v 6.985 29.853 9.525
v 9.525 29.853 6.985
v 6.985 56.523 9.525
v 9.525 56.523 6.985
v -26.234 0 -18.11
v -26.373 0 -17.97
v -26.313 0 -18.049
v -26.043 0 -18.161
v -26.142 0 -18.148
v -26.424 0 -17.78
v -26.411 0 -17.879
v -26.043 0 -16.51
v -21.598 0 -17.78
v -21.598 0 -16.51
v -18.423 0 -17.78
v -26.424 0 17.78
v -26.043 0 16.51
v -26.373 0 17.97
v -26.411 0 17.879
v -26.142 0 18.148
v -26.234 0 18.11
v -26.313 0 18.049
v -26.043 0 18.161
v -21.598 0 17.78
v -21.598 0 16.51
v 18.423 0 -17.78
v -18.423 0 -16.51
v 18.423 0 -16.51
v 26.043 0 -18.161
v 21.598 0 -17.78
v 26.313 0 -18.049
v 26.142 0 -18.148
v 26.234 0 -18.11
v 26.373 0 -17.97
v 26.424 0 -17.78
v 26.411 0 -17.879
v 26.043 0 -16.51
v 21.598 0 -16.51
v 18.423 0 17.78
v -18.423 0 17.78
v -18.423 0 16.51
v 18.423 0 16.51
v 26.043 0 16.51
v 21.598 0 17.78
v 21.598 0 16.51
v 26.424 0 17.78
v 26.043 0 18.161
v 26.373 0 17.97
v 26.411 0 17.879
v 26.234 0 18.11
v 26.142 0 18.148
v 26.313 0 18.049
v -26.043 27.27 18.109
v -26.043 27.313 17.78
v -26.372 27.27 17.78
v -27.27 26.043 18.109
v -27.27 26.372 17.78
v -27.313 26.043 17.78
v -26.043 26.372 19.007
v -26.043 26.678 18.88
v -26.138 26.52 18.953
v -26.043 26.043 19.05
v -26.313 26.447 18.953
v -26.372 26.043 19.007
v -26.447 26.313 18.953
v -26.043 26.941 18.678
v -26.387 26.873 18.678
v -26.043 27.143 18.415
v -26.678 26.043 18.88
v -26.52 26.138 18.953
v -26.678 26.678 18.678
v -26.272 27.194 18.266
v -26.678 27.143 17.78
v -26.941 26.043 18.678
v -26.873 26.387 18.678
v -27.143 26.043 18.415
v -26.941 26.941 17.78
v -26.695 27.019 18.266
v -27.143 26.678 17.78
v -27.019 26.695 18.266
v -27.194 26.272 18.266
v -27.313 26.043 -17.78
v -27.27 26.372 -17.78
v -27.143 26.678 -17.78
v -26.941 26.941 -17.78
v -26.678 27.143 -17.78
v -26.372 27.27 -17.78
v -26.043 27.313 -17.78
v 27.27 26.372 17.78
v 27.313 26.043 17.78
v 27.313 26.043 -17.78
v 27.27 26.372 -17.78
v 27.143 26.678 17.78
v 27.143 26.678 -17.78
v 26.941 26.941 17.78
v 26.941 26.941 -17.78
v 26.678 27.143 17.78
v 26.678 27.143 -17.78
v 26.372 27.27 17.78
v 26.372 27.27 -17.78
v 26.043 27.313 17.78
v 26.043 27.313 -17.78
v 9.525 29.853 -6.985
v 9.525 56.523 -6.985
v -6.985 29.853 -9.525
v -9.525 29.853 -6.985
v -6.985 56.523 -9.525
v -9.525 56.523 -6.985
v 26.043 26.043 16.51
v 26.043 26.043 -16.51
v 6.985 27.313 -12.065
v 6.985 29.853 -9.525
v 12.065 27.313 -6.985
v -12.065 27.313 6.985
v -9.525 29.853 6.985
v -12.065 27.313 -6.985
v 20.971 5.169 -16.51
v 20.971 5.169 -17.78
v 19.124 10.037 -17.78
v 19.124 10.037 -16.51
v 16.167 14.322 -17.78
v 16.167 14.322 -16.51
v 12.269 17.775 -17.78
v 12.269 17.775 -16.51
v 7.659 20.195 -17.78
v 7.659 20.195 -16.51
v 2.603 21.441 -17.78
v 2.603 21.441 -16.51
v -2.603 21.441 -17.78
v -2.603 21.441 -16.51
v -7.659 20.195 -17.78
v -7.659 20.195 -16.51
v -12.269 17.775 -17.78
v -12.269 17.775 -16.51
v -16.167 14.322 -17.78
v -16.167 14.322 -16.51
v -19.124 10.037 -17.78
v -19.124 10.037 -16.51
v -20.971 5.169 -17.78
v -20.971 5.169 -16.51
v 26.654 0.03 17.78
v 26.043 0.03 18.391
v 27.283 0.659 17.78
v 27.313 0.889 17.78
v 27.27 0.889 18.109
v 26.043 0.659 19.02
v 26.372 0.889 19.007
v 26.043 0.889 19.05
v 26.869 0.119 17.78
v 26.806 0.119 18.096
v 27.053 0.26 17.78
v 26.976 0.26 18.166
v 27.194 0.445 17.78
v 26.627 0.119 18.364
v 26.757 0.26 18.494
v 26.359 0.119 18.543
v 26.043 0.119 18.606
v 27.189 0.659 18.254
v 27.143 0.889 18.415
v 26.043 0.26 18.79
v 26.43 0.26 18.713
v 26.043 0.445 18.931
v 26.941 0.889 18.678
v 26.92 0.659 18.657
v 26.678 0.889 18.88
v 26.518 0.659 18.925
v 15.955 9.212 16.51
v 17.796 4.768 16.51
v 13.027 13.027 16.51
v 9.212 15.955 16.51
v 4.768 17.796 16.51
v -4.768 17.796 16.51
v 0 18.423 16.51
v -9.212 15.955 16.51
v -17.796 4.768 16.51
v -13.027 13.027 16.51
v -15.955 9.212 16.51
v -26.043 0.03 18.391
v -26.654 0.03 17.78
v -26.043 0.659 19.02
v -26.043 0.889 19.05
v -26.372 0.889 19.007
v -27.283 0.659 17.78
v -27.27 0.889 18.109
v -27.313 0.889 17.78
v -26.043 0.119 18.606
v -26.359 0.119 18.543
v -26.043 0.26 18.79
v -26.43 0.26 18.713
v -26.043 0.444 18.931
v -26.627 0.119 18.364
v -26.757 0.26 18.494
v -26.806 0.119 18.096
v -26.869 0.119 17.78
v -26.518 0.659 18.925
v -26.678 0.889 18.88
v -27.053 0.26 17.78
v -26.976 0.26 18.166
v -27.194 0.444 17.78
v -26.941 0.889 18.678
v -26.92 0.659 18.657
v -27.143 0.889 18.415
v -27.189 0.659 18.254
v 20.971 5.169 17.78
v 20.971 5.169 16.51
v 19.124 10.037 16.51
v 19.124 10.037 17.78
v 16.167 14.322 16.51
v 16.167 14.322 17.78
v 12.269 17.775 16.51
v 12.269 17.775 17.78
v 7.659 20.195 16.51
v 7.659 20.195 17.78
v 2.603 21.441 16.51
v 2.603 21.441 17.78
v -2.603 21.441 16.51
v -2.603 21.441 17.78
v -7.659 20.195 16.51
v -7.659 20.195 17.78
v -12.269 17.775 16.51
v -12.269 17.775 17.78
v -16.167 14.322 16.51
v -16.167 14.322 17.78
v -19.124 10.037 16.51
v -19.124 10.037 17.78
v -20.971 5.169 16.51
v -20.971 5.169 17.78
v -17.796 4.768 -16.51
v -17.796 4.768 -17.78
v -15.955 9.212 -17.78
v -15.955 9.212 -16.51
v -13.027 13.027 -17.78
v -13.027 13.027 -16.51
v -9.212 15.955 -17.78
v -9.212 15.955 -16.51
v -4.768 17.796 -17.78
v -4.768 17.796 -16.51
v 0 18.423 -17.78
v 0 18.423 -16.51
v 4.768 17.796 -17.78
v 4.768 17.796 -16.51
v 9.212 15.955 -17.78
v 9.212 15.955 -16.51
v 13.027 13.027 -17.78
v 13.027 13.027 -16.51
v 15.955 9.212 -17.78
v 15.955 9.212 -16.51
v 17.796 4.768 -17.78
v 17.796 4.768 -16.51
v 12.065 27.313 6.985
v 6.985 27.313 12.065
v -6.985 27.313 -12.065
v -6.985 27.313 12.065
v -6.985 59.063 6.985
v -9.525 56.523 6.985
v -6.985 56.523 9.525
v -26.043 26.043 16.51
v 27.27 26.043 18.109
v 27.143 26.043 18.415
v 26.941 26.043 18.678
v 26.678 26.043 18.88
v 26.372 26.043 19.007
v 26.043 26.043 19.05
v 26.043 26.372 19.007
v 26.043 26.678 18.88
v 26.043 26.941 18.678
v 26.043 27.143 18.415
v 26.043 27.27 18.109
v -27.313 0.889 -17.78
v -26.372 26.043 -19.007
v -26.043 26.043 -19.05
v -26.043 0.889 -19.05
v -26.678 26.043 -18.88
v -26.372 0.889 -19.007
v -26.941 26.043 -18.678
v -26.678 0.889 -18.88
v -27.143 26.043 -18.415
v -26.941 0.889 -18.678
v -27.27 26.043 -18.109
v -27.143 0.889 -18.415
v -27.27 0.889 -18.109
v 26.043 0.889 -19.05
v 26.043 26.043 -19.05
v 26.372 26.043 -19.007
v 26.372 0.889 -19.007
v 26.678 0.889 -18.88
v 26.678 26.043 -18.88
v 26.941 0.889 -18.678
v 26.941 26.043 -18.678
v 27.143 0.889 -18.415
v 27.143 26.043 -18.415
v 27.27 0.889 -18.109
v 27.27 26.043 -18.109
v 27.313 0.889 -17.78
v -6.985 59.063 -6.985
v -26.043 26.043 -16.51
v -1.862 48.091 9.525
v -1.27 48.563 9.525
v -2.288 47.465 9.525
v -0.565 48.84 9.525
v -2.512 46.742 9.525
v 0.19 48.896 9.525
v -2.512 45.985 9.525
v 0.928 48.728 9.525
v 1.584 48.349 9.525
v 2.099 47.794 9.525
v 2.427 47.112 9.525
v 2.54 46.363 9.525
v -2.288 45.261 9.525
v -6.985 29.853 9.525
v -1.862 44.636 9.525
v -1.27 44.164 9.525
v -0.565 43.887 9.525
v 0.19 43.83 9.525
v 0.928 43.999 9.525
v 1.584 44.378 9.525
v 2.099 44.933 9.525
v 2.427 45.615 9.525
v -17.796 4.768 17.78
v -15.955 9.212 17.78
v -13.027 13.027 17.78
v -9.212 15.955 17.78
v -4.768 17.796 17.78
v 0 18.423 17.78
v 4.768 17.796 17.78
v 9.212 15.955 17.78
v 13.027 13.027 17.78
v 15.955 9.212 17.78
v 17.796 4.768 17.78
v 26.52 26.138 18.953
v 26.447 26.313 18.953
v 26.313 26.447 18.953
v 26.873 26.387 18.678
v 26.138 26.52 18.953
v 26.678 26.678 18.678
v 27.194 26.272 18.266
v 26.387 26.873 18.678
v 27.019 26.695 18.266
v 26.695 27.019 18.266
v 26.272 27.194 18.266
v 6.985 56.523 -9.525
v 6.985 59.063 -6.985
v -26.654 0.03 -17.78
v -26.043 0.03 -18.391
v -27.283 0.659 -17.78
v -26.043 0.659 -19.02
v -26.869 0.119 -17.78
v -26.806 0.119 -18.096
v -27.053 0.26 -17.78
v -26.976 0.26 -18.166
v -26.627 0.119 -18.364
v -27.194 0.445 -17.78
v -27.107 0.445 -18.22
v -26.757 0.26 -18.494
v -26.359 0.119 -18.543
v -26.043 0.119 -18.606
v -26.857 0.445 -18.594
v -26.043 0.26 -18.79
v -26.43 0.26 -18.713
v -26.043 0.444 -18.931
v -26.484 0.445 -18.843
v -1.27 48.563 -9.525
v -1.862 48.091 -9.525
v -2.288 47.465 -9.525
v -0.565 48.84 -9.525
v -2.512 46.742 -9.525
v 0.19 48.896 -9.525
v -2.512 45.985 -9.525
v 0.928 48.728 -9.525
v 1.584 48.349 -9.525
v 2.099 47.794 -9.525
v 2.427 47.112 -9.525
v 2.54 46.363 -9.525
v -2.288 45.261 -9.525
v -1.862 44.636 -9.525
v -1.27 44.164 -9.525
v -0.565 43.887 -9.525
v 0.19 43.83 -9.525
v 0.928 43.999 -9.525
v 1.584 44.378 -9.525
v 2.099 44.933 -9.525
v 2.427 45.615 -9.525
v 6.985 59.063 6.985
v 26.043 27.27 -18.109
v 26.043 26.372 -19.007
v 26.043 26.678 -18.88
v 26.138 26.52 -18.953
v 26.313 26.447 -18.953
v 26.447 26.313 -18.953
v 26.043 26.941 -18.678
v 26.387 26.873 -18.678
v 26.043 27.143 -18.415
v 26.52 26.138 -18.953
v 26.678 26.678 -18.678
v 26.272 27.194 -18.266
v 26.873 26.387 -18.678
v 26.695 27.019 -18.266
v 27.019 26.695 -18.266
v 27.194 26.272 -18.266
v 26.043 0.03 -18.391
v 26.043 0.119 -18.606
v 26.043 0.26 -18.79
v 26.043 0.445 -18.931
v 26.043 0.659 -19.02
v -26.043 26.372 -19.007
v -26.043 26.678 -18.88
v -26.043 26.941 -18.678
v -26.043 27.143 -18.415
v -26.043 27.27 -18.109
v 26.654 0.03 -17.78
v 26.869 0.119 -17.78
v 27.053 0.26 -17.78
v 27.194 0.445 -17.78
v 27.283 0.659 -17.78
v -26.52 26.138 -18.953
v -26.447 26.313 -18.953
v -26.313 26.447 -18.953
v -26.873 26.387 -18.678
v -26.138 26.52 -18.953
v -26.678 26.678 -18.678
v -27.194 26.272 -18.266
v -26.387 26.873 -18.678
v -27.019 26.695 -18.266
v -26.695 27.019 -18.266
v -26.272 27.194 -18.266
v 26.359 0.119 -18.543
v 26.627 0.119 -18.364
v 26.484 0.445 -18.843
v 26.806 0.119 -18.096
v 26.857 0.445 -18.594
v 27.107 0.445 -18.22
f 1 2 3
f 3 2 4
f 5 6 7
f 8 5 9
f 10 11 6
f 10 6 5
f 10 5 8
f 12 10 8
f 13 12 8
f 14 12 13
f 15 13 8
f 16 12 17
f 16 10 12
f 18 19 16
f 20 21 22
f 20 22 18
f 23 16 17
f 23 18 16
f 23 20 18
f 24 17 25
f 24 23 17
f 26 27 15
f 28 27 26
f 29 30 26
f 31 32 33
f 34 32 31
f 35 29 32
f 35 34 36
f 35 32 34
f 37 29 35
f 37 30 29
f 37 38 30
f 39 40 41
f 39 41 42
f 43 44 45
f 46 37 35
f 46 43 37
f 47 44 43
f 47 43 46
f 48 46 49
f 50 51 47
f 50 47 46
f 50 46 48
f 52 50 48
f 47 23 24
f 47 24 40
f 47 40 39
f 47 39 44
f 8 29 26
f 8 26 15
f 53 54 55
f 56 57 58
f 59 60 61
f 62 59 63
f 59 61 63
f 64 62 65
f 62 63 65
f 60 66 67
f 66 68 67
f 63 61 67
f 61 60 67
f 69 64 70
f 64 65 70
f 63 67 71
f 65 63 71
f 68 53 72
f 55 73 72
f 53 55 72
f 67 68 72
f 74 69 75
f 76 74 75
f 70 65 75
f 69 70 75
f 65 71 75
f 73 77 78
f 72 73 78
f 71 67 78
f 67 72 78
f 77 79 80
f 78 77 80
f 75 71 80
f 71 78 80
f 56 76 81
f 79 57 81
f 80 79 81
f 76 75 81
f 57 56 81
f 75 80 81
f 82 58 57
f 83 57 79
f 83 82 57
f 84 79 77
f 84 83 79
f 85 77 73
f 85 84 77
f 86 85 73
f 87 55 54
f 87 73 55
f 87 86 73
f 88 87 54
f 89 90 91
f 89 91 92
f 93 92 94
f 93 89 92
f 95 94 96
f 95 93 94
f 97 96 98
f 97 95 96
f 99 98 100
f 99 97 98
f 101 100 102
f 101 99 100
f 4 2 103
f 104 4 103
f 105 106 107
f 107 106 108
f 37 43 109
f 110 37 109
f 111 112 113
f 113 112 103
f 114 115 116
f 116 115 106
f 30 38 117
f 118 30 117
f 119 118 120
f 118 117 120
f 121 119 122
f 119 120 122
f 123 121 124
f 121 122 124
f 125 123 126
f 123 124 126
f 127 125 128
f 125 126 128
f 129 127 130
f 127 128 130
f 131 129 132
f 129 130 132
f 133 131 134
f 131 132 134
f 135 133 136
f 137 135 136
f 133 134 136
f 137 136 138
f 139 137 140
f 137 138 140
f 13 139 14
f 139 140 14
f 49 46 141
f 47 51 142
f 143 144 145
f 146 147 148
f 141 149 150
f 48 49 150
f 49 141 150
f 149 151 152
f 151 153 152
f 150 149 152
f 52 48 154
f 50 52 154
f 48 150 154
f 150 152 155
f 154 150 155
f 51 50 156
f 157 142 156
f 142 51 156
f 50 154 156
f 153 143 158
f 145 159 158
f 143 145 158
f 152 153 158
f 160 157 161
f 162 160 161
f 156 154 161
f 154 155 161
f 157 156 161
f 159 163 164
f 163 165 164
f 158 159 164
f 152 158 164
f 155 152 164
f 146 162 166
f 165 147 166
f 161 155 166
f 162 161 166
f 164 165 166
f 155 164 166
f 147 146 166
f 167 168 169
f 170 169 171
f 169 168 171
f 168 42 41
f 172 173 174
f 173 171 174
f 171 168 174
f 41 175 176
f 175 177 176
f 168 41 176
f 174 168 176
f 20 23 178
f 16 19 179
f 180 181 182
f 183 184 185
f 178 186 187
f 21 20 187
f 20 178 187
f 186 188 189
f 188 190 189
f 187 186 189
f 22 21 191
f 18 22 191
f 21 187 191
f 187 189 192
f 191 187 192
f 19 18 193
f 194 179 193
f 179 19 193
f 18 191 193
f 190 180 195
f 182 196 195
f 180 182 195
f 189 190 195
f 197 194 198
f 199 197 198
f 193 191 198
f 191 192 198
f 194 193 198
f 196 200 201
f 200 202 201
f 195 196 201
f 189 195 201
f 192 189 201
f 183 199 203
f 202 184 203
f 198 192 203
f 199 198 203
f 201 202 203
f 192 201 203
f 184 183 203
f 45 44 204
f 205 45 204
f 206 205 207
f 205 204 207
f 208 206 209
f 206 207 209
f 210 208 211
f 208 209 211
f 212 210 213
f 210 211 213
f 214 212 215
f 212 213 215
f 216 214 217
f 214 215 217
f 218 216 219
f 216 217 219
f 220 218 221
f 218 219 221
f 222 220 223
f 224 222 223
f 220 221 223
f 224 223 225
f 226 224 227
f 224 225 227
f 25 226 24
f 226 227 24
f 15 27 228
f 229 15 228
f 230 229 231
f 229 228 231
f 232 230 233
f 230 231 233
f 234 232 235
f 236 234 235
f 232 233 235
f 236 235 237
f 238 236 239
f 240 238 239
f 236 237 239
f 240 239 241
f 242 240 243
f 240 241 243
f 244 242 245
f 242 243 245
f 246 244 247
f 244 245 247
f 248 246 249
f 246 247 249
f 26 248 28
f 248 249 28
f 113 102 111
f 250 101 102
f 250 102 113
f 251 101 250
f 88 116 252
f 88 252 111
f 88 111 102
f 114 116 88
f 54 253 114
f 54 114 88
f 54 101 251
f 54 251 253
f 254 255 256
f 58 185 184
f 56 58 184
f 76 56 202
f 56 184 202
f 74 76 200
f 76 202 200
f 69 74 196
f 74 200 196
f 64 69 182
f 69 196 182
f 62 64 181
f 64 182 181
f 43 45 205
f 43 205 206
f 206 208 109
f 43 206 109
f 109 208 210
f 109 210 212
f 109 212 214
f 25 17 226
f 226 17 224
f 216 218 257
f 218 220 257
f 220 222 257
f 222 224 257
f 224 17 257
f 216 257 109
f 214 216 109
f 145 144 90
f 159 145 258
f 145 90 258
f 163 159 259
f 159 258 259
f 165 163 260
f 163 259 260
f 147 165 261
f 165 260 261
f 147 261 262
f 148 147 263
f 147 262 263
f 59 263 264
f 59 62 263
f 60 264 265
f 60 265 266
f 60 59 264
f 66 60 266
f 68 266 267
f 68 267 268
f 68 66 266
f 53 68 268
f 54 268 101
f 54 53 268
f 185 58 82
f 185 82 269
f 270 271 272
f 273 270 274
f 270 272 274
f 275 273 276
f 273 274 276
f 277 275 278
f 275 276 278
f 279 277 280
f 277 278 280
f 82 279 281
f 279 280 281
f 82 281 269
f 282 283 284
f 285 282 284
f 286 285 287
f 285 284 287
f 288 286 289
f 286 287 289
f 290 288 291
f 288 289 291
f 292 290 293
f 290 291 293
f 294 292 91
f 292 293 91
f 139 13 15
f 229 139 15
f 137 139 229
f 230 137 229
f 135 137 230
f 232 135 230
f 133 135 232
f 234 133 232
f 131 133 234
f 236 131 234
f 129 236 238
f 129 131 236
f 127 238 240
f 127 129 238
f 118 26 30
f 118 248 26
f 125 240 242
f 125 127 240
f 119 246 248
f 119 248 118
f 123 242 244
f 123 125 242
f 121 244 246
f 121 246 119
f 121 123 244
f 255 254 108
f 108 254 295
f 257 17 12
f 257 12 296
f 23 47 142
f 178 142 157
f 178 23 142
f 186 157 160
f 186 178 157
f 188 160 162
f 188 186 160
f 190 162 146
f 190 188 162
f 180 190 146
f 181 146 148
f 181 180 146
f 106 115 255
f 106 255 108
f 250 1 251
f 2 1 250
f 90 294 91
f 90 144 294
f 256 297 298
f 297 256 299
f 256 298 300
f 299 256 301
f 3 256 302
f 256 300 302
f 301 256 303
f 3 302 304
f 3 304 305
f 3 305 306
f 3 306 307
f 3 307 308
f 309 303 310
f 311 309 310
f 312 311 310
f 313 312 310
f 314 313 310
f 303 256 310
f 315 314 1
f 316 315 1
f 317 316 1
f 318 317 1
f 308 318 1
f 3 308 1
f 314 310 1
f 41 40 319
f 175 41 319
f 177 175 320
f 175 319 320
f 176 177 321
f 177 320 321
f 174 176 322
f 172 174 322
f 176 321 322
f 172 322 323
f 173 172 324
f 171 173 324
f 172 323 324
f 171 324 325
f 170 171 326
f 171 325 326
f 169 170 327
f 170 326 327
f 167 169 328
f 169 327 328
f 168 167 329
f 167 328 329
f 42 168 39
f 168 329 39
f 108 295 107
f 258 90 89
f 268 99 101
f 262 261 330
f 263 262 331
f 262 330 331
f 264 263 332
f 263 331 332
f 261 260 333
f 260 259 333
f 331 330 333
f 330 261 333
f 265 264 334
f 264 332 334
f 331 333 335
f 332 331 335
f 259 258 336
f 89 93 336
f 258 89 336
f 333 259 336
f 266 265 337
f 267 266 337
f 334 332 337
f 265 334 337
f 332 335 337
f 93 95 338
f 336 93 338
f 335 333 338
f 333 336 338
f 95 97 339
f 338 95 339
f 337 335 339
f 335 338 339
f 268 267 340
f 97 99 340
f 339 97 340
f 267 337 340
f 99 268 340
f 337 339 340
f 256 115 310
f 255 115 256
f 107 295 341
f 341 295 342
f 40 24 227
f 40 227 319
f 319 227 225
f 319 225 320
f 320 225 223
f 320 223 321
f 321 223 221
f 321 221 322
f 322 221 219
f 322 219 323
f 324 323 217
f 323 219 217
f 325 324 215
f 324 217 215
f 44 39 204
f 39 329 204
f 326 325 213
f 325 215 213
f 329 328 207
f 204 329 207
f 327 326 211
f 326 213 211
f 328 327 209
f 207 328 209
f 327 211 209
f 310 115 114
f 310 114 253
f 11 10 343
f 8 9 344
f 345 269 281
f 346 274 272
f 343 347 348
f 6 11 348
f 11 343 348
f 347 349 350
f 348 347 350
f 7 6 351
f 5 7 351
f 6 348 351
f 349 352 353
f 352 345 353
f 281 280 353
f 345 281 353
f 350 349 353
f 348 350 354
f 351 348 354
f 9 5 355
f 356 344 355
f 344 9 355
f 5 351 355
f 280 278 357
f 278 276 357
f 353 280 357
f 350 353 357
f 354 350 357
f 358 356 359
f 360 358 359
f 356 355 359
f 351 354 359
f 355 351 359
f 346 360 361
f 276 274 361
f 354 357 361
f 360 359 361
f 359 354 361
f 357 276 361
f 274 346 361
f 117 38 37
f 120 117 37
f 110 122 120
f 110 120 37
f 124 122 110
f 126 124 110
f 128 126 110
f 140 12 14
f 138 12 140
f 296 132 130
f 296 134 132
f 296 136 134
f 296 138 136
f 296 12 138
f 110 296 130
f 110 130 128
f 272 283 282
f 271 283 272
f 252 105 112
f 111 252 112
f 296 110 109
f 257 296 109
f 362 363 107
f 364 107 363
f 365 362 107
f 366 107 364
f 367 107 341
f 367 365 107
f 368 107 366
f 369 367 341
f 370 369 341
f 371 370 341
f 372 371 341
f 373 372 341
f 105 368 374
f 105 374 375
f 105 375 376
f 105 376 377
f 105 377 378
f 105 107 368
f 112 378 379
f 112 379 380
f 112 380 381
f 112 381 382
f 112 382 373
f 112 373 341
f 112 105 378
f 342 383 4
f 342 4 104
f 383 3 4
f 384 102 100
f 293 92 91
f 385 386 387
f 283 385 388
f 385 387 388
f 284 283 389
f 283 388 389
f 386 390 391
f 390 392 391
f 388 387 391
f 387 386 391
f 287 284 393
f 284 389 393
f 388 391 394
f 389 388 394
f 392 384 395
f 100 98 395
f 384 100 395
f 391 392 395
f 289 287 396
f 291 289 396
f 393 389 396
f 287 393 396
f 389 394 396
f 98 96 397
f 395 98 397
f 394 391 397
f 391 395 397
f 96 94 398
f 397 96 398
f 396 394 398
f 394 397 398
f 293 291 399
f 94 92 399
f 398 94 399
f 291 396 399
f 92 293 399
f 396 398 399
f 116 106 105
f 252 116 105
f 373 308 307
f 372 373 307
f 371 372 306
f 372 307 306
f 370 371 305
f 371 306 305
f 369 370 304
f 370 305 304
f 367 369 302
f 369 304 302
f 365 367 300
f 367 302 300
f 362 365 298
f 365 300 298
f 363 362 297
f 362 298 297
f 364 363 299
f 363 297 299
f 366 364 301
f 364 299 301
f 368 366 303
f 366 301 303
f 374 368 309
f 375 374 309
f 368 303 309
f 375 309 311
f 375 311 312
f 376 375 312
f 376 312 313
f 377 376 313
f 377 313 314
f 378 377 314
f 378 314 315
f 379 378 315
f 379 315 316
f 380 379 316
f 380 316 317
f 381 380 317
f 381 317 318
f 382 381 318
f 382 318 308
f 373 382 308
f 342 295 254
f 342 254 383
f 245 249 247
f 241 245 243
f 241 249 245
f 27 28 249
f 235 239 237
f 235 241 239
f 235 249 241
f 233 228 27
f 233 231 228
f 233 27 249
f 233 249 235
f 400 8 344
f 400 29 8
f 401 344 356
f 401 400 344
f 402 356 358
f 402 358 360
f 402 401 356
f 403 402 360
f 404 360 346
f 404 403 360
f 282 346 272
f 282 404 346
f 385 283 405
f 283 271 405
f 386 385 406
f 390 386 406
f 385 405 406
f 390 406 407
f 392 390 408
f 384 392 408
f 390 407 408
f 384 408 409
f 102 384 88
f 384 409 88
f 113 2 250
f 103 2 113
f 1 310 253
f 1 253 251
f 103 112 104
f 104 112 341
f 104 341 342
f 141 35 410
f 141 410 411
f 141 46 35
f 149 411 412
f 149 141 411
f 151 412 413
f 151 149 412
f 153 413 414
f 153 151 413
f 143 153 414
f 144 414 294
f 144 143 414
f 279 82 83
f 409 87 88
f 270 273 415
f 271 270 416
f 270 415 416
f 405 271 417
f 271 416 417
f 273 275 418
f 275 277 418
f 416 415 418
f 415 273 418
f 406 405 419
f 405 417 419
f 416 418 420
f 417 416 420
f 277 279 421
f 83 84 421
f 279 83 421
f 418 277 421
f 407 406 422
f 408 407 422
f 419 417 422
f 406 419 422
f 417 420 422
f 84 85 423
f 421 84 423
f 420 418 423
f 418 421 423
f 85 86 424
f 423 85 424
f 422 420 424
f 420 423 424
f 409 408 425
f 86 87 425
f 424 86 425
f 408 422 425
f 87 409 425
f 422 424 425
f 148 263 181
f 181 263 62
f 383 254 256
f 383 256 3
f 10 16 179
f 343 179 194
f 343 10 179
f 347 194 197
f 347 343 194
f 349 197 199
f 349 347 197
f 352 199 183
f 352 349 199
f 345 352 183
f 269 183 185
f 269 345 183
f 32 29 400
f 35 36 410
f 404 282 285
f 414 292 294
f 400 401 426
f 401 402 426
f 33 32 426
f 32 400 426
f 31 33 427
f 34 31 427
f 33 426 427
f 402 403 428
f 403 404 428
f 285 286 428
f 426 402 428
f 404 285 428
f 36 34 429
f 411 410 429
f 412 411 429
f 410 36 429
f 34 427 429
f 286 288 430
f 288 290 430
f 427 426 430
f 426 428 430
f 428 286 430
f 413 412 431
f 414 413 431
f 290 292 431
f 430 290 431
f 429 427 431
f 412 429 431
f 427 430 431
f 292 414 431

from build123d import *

# Parameters (mm, degrees)
MAIN_BODY_EXTRUDE_DEPTH        = 19.05
HINGE_START                    = -26.043353817
HINGE_SHELL_OUTLINE_W          = 26.043353817
HINGE_SHELL_OUTLINE_H          = 33.02
HINGE_SHELL_DEPTH              = 52.086707634
GROOVE_START                   = -16.51
GROOVE_1_DEPTH                 = 1.27
GROOVE_START_2                 = 17.78
GROOVE_2_DEPTH                 = 1.27
SKETCH5_W                      = 19.05
SKETCH5_H                      = 19.05
TIBIA_CONNECTION_EXTRUDE_DEPTH = 31.75
SKETCH6_R                      = 2.54
PINHOLE_CUT_DEPTH              = 25.4
FILLET1_R                      = 1.27
CHAMFER1_SIZE                  = 2.54
FILLET2_R                      = 0.889


# Read off the part's stored shape, not the designer's step: Hinge Shell
with BuildPart() as part:
    # Sketch1 → Main Body Extrude (new, symmetric)
    with BuildSketch(Plane.XY):
        with BuildLine():
            Line((18.423353817, 0), (-18.423353817, 0))
            ThreePointArc((-18.423353817, 0), (0, 18.423353817), (18.423353817, 0))
        make_face()
        with BuildLine():
            Line((18.423353817, 0), (21.598353817, 0))
            ThreePointArc((21.598353817, 0), (0, 21.598353817), (-21.598353817, 0))
            Line((-21.598353817, 0), (-18.423353817, 0))
            ThreePointArc((-18.423353817, 0), (0, 18.423353817), (18.423353817, 0))
        make_face()
        with BuildLine():
            Line((24.138353817, 0), (21.598353817, 0))
            ThreePointArc((21.598353817, 0), (0, 21.598353817), (-21.598353817, 0))
            Line((-21.598353817, 0), (-24.138353817, 0))
            ThreePointArc((-24.138353817, 0), (0, 24.138353817), (24.138353817, 0))
        make_face()
        with BuildLine():
            ThreePointArc((24.138353817, 0), (0, 24.138353817), (-24.138353817, 0))
            Line((-24.138353817, 0), (-24.773353817, 0))
            ThreePointArc((-24.773353817, 0), (0, 24.773353817), (24.773353817, 0))
            Line((24.773353817, 0), (24.138353817, 0))
        make_face()
        with BuildLine():
            Line((27.313353817, 0), (24.773353817, 0))
            ThreePointArc((24.773353817, 0), (0, 24.773353817), (-24.773353817, 0))
            Line((-24.773353817, 0), (-27.313353817, 0))
            ThreePointArc((-27.313353817, 0), (0, 27.313353817), (27.313353817, 0))
        make_face()
        with BuildLine():
            Line((-27.313353817, 27.313353817), (-27.313353817, 0))
            ThreePointArc((-27.313353817, 0), (-19.313457701, 19.313457701), (0, 27.313353817))
            Line((0, 27.313353817), (-27.313353817, 27.313353817))
        make_face()
        with BuildLine():
            Line((27.313353817, 27.313353817), (0, 27.313353817))
            ThreePointArc((0, 27.313353817), (19.313457701, 19.313457701), (27.313353817, 0))
            Line((27.313353817, 0), (27.313353817, 27.313353817))
        make_face()
    extrude(amount=MAIN_BODY_EXTRUDE_DEPTH, both=True)

    # Hinge Shell outline → Hinge Shell (cut)
    with BuildSketch(Plane.YZ.offset(HINGE_START)):
        with Locations((13.021676908, 0)):
            Rectangle(HINGE_SHELL_OUTLINE_W, HINGE_SHELL_OUTLINE_H)
    extrude(amount=HINGE_SHELL_DEPTH, mode=Mode.SUBTRACT)

    # Sketch1<13> → Groove 1 (cut)
    with BuildSketch(Plane.XY.offset(GROOVE_START)):
        with BuildLine():
            Line((18.423353817, 0), (21.598353817, 0))
            ThreePointArc((21.598353817, 0), (0, 21.598353817), (-21.598353817, 0))
            Line((-21.598353817, 0), (-18.423353817, 0))
            ThreePointArc((-18.423353817, 0), (0, 18.423353817), (18.423353817, 0))
        make_face()
    extrude(amount=-GROOVE_1_DEPTH, mode=Mode.SUBTRACT)

    # Sketch1<14> → Groove 2 (cut)
    with BuildSketch(Plane.XY.offset(GROOVE_START_2)):
        with BuildLine():
            Line((18.423353817, 0), (21.598353817, 0))
            ThreePointArc((21.598353817, 0), (0, 21.598353817), (-21.598353817, 0))
            Line((-21.598353817, 0), (-18.423353817, 0))
            ThreePointArc((-18.423353817, 0), (0, 18.423353817), (18.423353817, 0))
        make_face()
    extrude(amount=-GROOVE_2_DEPTH, mode=Mode.SUBTRACT)

    # Sketch5 → Tibia Connection Extrude (add)
    with BuildSketch(Plane(origin=(0, 27.313353817, 0), x_dir=(1, 0, 0), z_dir=(0, 1, 0))):
        Rectangle(SKETCH5_W, SKETCH5_H)
    extrude(amount=TIBIA_CONNECTION_EXTRUDE_DEPTH)

    # Sketch6 → Pinhole Cut (cut)
    with BuildSketch(Plane.XY.offset(9.525)):
        with Locations((0, 46.363353817)):
            Circle(SKETCH6_R)
    extrude(amount=-PINHOLE_CUT_DEPTH, mode=Mode.SUBTRACT)

    # Fillet1
    fillet1_edges = [part.edges().sort_by_distance(p)[0] for p in [
        (-27.313353817, 27.313353817, 0),
        (27.313353817, 27.313353817, 0),
        (27.313353817, 13.656676909, 19.05),
        (0, 27.313353817, 19.05),
        (-27.313353817, 13.656676909, 19.05),
        (-27.313353817, 13.656676909, -19.05),
        (0, 27.313353817, -19.05),
        (27.313353817, 13.656676909, -19.05),
    ]]
    fillet(fillet1_edges, radius=FILLET1_R)

    # Chamfer1
    chamfer1_edges = [part.edges().sort_by_distance(p)[0] for p in [
        (0, 27.313353817, 9.525),
        (-9.525, 43.188353817, 9.525),
        (9.525, 27.313353817, 0),
        (9.525, 43.188353817, 9.525),
        (0, 59.063353817, -9.525),
        (9.525, 43.188353817, -9.525),
        (-9.525, 59.063353817, 0),
        (-9.525, 43.188353817, -9.525),
        (0, 59.063353817, 9.525),
        (9.525, 59.063353817, 0),
        (-9.525, 27.313353817, 0),
        (0, 27.313353817, -9.525),
    ]]
    chamfer(chamfer1_edges, length=CHAMFER1_SIZE)

    # Fillet2
    fillet2_edges = [part.edges().sort_by_distance(p)[0] for p in [
        (26.941379429, 0, -18.678025612),
        (0, 0, -19.05),
        (27.313353817, 0, 0),
        (0, 0, 19.05),
        (-27.313353817, 0, 0),
        (26.941379429, 0, 18.678025612),
        (-26.941379429, 0, 18.678025612),
        (-26.941379429, 0, -18.678025612),
    ]]
    fillet(fillet2_edges, radius=FILLET2_R)


solid = part.part
